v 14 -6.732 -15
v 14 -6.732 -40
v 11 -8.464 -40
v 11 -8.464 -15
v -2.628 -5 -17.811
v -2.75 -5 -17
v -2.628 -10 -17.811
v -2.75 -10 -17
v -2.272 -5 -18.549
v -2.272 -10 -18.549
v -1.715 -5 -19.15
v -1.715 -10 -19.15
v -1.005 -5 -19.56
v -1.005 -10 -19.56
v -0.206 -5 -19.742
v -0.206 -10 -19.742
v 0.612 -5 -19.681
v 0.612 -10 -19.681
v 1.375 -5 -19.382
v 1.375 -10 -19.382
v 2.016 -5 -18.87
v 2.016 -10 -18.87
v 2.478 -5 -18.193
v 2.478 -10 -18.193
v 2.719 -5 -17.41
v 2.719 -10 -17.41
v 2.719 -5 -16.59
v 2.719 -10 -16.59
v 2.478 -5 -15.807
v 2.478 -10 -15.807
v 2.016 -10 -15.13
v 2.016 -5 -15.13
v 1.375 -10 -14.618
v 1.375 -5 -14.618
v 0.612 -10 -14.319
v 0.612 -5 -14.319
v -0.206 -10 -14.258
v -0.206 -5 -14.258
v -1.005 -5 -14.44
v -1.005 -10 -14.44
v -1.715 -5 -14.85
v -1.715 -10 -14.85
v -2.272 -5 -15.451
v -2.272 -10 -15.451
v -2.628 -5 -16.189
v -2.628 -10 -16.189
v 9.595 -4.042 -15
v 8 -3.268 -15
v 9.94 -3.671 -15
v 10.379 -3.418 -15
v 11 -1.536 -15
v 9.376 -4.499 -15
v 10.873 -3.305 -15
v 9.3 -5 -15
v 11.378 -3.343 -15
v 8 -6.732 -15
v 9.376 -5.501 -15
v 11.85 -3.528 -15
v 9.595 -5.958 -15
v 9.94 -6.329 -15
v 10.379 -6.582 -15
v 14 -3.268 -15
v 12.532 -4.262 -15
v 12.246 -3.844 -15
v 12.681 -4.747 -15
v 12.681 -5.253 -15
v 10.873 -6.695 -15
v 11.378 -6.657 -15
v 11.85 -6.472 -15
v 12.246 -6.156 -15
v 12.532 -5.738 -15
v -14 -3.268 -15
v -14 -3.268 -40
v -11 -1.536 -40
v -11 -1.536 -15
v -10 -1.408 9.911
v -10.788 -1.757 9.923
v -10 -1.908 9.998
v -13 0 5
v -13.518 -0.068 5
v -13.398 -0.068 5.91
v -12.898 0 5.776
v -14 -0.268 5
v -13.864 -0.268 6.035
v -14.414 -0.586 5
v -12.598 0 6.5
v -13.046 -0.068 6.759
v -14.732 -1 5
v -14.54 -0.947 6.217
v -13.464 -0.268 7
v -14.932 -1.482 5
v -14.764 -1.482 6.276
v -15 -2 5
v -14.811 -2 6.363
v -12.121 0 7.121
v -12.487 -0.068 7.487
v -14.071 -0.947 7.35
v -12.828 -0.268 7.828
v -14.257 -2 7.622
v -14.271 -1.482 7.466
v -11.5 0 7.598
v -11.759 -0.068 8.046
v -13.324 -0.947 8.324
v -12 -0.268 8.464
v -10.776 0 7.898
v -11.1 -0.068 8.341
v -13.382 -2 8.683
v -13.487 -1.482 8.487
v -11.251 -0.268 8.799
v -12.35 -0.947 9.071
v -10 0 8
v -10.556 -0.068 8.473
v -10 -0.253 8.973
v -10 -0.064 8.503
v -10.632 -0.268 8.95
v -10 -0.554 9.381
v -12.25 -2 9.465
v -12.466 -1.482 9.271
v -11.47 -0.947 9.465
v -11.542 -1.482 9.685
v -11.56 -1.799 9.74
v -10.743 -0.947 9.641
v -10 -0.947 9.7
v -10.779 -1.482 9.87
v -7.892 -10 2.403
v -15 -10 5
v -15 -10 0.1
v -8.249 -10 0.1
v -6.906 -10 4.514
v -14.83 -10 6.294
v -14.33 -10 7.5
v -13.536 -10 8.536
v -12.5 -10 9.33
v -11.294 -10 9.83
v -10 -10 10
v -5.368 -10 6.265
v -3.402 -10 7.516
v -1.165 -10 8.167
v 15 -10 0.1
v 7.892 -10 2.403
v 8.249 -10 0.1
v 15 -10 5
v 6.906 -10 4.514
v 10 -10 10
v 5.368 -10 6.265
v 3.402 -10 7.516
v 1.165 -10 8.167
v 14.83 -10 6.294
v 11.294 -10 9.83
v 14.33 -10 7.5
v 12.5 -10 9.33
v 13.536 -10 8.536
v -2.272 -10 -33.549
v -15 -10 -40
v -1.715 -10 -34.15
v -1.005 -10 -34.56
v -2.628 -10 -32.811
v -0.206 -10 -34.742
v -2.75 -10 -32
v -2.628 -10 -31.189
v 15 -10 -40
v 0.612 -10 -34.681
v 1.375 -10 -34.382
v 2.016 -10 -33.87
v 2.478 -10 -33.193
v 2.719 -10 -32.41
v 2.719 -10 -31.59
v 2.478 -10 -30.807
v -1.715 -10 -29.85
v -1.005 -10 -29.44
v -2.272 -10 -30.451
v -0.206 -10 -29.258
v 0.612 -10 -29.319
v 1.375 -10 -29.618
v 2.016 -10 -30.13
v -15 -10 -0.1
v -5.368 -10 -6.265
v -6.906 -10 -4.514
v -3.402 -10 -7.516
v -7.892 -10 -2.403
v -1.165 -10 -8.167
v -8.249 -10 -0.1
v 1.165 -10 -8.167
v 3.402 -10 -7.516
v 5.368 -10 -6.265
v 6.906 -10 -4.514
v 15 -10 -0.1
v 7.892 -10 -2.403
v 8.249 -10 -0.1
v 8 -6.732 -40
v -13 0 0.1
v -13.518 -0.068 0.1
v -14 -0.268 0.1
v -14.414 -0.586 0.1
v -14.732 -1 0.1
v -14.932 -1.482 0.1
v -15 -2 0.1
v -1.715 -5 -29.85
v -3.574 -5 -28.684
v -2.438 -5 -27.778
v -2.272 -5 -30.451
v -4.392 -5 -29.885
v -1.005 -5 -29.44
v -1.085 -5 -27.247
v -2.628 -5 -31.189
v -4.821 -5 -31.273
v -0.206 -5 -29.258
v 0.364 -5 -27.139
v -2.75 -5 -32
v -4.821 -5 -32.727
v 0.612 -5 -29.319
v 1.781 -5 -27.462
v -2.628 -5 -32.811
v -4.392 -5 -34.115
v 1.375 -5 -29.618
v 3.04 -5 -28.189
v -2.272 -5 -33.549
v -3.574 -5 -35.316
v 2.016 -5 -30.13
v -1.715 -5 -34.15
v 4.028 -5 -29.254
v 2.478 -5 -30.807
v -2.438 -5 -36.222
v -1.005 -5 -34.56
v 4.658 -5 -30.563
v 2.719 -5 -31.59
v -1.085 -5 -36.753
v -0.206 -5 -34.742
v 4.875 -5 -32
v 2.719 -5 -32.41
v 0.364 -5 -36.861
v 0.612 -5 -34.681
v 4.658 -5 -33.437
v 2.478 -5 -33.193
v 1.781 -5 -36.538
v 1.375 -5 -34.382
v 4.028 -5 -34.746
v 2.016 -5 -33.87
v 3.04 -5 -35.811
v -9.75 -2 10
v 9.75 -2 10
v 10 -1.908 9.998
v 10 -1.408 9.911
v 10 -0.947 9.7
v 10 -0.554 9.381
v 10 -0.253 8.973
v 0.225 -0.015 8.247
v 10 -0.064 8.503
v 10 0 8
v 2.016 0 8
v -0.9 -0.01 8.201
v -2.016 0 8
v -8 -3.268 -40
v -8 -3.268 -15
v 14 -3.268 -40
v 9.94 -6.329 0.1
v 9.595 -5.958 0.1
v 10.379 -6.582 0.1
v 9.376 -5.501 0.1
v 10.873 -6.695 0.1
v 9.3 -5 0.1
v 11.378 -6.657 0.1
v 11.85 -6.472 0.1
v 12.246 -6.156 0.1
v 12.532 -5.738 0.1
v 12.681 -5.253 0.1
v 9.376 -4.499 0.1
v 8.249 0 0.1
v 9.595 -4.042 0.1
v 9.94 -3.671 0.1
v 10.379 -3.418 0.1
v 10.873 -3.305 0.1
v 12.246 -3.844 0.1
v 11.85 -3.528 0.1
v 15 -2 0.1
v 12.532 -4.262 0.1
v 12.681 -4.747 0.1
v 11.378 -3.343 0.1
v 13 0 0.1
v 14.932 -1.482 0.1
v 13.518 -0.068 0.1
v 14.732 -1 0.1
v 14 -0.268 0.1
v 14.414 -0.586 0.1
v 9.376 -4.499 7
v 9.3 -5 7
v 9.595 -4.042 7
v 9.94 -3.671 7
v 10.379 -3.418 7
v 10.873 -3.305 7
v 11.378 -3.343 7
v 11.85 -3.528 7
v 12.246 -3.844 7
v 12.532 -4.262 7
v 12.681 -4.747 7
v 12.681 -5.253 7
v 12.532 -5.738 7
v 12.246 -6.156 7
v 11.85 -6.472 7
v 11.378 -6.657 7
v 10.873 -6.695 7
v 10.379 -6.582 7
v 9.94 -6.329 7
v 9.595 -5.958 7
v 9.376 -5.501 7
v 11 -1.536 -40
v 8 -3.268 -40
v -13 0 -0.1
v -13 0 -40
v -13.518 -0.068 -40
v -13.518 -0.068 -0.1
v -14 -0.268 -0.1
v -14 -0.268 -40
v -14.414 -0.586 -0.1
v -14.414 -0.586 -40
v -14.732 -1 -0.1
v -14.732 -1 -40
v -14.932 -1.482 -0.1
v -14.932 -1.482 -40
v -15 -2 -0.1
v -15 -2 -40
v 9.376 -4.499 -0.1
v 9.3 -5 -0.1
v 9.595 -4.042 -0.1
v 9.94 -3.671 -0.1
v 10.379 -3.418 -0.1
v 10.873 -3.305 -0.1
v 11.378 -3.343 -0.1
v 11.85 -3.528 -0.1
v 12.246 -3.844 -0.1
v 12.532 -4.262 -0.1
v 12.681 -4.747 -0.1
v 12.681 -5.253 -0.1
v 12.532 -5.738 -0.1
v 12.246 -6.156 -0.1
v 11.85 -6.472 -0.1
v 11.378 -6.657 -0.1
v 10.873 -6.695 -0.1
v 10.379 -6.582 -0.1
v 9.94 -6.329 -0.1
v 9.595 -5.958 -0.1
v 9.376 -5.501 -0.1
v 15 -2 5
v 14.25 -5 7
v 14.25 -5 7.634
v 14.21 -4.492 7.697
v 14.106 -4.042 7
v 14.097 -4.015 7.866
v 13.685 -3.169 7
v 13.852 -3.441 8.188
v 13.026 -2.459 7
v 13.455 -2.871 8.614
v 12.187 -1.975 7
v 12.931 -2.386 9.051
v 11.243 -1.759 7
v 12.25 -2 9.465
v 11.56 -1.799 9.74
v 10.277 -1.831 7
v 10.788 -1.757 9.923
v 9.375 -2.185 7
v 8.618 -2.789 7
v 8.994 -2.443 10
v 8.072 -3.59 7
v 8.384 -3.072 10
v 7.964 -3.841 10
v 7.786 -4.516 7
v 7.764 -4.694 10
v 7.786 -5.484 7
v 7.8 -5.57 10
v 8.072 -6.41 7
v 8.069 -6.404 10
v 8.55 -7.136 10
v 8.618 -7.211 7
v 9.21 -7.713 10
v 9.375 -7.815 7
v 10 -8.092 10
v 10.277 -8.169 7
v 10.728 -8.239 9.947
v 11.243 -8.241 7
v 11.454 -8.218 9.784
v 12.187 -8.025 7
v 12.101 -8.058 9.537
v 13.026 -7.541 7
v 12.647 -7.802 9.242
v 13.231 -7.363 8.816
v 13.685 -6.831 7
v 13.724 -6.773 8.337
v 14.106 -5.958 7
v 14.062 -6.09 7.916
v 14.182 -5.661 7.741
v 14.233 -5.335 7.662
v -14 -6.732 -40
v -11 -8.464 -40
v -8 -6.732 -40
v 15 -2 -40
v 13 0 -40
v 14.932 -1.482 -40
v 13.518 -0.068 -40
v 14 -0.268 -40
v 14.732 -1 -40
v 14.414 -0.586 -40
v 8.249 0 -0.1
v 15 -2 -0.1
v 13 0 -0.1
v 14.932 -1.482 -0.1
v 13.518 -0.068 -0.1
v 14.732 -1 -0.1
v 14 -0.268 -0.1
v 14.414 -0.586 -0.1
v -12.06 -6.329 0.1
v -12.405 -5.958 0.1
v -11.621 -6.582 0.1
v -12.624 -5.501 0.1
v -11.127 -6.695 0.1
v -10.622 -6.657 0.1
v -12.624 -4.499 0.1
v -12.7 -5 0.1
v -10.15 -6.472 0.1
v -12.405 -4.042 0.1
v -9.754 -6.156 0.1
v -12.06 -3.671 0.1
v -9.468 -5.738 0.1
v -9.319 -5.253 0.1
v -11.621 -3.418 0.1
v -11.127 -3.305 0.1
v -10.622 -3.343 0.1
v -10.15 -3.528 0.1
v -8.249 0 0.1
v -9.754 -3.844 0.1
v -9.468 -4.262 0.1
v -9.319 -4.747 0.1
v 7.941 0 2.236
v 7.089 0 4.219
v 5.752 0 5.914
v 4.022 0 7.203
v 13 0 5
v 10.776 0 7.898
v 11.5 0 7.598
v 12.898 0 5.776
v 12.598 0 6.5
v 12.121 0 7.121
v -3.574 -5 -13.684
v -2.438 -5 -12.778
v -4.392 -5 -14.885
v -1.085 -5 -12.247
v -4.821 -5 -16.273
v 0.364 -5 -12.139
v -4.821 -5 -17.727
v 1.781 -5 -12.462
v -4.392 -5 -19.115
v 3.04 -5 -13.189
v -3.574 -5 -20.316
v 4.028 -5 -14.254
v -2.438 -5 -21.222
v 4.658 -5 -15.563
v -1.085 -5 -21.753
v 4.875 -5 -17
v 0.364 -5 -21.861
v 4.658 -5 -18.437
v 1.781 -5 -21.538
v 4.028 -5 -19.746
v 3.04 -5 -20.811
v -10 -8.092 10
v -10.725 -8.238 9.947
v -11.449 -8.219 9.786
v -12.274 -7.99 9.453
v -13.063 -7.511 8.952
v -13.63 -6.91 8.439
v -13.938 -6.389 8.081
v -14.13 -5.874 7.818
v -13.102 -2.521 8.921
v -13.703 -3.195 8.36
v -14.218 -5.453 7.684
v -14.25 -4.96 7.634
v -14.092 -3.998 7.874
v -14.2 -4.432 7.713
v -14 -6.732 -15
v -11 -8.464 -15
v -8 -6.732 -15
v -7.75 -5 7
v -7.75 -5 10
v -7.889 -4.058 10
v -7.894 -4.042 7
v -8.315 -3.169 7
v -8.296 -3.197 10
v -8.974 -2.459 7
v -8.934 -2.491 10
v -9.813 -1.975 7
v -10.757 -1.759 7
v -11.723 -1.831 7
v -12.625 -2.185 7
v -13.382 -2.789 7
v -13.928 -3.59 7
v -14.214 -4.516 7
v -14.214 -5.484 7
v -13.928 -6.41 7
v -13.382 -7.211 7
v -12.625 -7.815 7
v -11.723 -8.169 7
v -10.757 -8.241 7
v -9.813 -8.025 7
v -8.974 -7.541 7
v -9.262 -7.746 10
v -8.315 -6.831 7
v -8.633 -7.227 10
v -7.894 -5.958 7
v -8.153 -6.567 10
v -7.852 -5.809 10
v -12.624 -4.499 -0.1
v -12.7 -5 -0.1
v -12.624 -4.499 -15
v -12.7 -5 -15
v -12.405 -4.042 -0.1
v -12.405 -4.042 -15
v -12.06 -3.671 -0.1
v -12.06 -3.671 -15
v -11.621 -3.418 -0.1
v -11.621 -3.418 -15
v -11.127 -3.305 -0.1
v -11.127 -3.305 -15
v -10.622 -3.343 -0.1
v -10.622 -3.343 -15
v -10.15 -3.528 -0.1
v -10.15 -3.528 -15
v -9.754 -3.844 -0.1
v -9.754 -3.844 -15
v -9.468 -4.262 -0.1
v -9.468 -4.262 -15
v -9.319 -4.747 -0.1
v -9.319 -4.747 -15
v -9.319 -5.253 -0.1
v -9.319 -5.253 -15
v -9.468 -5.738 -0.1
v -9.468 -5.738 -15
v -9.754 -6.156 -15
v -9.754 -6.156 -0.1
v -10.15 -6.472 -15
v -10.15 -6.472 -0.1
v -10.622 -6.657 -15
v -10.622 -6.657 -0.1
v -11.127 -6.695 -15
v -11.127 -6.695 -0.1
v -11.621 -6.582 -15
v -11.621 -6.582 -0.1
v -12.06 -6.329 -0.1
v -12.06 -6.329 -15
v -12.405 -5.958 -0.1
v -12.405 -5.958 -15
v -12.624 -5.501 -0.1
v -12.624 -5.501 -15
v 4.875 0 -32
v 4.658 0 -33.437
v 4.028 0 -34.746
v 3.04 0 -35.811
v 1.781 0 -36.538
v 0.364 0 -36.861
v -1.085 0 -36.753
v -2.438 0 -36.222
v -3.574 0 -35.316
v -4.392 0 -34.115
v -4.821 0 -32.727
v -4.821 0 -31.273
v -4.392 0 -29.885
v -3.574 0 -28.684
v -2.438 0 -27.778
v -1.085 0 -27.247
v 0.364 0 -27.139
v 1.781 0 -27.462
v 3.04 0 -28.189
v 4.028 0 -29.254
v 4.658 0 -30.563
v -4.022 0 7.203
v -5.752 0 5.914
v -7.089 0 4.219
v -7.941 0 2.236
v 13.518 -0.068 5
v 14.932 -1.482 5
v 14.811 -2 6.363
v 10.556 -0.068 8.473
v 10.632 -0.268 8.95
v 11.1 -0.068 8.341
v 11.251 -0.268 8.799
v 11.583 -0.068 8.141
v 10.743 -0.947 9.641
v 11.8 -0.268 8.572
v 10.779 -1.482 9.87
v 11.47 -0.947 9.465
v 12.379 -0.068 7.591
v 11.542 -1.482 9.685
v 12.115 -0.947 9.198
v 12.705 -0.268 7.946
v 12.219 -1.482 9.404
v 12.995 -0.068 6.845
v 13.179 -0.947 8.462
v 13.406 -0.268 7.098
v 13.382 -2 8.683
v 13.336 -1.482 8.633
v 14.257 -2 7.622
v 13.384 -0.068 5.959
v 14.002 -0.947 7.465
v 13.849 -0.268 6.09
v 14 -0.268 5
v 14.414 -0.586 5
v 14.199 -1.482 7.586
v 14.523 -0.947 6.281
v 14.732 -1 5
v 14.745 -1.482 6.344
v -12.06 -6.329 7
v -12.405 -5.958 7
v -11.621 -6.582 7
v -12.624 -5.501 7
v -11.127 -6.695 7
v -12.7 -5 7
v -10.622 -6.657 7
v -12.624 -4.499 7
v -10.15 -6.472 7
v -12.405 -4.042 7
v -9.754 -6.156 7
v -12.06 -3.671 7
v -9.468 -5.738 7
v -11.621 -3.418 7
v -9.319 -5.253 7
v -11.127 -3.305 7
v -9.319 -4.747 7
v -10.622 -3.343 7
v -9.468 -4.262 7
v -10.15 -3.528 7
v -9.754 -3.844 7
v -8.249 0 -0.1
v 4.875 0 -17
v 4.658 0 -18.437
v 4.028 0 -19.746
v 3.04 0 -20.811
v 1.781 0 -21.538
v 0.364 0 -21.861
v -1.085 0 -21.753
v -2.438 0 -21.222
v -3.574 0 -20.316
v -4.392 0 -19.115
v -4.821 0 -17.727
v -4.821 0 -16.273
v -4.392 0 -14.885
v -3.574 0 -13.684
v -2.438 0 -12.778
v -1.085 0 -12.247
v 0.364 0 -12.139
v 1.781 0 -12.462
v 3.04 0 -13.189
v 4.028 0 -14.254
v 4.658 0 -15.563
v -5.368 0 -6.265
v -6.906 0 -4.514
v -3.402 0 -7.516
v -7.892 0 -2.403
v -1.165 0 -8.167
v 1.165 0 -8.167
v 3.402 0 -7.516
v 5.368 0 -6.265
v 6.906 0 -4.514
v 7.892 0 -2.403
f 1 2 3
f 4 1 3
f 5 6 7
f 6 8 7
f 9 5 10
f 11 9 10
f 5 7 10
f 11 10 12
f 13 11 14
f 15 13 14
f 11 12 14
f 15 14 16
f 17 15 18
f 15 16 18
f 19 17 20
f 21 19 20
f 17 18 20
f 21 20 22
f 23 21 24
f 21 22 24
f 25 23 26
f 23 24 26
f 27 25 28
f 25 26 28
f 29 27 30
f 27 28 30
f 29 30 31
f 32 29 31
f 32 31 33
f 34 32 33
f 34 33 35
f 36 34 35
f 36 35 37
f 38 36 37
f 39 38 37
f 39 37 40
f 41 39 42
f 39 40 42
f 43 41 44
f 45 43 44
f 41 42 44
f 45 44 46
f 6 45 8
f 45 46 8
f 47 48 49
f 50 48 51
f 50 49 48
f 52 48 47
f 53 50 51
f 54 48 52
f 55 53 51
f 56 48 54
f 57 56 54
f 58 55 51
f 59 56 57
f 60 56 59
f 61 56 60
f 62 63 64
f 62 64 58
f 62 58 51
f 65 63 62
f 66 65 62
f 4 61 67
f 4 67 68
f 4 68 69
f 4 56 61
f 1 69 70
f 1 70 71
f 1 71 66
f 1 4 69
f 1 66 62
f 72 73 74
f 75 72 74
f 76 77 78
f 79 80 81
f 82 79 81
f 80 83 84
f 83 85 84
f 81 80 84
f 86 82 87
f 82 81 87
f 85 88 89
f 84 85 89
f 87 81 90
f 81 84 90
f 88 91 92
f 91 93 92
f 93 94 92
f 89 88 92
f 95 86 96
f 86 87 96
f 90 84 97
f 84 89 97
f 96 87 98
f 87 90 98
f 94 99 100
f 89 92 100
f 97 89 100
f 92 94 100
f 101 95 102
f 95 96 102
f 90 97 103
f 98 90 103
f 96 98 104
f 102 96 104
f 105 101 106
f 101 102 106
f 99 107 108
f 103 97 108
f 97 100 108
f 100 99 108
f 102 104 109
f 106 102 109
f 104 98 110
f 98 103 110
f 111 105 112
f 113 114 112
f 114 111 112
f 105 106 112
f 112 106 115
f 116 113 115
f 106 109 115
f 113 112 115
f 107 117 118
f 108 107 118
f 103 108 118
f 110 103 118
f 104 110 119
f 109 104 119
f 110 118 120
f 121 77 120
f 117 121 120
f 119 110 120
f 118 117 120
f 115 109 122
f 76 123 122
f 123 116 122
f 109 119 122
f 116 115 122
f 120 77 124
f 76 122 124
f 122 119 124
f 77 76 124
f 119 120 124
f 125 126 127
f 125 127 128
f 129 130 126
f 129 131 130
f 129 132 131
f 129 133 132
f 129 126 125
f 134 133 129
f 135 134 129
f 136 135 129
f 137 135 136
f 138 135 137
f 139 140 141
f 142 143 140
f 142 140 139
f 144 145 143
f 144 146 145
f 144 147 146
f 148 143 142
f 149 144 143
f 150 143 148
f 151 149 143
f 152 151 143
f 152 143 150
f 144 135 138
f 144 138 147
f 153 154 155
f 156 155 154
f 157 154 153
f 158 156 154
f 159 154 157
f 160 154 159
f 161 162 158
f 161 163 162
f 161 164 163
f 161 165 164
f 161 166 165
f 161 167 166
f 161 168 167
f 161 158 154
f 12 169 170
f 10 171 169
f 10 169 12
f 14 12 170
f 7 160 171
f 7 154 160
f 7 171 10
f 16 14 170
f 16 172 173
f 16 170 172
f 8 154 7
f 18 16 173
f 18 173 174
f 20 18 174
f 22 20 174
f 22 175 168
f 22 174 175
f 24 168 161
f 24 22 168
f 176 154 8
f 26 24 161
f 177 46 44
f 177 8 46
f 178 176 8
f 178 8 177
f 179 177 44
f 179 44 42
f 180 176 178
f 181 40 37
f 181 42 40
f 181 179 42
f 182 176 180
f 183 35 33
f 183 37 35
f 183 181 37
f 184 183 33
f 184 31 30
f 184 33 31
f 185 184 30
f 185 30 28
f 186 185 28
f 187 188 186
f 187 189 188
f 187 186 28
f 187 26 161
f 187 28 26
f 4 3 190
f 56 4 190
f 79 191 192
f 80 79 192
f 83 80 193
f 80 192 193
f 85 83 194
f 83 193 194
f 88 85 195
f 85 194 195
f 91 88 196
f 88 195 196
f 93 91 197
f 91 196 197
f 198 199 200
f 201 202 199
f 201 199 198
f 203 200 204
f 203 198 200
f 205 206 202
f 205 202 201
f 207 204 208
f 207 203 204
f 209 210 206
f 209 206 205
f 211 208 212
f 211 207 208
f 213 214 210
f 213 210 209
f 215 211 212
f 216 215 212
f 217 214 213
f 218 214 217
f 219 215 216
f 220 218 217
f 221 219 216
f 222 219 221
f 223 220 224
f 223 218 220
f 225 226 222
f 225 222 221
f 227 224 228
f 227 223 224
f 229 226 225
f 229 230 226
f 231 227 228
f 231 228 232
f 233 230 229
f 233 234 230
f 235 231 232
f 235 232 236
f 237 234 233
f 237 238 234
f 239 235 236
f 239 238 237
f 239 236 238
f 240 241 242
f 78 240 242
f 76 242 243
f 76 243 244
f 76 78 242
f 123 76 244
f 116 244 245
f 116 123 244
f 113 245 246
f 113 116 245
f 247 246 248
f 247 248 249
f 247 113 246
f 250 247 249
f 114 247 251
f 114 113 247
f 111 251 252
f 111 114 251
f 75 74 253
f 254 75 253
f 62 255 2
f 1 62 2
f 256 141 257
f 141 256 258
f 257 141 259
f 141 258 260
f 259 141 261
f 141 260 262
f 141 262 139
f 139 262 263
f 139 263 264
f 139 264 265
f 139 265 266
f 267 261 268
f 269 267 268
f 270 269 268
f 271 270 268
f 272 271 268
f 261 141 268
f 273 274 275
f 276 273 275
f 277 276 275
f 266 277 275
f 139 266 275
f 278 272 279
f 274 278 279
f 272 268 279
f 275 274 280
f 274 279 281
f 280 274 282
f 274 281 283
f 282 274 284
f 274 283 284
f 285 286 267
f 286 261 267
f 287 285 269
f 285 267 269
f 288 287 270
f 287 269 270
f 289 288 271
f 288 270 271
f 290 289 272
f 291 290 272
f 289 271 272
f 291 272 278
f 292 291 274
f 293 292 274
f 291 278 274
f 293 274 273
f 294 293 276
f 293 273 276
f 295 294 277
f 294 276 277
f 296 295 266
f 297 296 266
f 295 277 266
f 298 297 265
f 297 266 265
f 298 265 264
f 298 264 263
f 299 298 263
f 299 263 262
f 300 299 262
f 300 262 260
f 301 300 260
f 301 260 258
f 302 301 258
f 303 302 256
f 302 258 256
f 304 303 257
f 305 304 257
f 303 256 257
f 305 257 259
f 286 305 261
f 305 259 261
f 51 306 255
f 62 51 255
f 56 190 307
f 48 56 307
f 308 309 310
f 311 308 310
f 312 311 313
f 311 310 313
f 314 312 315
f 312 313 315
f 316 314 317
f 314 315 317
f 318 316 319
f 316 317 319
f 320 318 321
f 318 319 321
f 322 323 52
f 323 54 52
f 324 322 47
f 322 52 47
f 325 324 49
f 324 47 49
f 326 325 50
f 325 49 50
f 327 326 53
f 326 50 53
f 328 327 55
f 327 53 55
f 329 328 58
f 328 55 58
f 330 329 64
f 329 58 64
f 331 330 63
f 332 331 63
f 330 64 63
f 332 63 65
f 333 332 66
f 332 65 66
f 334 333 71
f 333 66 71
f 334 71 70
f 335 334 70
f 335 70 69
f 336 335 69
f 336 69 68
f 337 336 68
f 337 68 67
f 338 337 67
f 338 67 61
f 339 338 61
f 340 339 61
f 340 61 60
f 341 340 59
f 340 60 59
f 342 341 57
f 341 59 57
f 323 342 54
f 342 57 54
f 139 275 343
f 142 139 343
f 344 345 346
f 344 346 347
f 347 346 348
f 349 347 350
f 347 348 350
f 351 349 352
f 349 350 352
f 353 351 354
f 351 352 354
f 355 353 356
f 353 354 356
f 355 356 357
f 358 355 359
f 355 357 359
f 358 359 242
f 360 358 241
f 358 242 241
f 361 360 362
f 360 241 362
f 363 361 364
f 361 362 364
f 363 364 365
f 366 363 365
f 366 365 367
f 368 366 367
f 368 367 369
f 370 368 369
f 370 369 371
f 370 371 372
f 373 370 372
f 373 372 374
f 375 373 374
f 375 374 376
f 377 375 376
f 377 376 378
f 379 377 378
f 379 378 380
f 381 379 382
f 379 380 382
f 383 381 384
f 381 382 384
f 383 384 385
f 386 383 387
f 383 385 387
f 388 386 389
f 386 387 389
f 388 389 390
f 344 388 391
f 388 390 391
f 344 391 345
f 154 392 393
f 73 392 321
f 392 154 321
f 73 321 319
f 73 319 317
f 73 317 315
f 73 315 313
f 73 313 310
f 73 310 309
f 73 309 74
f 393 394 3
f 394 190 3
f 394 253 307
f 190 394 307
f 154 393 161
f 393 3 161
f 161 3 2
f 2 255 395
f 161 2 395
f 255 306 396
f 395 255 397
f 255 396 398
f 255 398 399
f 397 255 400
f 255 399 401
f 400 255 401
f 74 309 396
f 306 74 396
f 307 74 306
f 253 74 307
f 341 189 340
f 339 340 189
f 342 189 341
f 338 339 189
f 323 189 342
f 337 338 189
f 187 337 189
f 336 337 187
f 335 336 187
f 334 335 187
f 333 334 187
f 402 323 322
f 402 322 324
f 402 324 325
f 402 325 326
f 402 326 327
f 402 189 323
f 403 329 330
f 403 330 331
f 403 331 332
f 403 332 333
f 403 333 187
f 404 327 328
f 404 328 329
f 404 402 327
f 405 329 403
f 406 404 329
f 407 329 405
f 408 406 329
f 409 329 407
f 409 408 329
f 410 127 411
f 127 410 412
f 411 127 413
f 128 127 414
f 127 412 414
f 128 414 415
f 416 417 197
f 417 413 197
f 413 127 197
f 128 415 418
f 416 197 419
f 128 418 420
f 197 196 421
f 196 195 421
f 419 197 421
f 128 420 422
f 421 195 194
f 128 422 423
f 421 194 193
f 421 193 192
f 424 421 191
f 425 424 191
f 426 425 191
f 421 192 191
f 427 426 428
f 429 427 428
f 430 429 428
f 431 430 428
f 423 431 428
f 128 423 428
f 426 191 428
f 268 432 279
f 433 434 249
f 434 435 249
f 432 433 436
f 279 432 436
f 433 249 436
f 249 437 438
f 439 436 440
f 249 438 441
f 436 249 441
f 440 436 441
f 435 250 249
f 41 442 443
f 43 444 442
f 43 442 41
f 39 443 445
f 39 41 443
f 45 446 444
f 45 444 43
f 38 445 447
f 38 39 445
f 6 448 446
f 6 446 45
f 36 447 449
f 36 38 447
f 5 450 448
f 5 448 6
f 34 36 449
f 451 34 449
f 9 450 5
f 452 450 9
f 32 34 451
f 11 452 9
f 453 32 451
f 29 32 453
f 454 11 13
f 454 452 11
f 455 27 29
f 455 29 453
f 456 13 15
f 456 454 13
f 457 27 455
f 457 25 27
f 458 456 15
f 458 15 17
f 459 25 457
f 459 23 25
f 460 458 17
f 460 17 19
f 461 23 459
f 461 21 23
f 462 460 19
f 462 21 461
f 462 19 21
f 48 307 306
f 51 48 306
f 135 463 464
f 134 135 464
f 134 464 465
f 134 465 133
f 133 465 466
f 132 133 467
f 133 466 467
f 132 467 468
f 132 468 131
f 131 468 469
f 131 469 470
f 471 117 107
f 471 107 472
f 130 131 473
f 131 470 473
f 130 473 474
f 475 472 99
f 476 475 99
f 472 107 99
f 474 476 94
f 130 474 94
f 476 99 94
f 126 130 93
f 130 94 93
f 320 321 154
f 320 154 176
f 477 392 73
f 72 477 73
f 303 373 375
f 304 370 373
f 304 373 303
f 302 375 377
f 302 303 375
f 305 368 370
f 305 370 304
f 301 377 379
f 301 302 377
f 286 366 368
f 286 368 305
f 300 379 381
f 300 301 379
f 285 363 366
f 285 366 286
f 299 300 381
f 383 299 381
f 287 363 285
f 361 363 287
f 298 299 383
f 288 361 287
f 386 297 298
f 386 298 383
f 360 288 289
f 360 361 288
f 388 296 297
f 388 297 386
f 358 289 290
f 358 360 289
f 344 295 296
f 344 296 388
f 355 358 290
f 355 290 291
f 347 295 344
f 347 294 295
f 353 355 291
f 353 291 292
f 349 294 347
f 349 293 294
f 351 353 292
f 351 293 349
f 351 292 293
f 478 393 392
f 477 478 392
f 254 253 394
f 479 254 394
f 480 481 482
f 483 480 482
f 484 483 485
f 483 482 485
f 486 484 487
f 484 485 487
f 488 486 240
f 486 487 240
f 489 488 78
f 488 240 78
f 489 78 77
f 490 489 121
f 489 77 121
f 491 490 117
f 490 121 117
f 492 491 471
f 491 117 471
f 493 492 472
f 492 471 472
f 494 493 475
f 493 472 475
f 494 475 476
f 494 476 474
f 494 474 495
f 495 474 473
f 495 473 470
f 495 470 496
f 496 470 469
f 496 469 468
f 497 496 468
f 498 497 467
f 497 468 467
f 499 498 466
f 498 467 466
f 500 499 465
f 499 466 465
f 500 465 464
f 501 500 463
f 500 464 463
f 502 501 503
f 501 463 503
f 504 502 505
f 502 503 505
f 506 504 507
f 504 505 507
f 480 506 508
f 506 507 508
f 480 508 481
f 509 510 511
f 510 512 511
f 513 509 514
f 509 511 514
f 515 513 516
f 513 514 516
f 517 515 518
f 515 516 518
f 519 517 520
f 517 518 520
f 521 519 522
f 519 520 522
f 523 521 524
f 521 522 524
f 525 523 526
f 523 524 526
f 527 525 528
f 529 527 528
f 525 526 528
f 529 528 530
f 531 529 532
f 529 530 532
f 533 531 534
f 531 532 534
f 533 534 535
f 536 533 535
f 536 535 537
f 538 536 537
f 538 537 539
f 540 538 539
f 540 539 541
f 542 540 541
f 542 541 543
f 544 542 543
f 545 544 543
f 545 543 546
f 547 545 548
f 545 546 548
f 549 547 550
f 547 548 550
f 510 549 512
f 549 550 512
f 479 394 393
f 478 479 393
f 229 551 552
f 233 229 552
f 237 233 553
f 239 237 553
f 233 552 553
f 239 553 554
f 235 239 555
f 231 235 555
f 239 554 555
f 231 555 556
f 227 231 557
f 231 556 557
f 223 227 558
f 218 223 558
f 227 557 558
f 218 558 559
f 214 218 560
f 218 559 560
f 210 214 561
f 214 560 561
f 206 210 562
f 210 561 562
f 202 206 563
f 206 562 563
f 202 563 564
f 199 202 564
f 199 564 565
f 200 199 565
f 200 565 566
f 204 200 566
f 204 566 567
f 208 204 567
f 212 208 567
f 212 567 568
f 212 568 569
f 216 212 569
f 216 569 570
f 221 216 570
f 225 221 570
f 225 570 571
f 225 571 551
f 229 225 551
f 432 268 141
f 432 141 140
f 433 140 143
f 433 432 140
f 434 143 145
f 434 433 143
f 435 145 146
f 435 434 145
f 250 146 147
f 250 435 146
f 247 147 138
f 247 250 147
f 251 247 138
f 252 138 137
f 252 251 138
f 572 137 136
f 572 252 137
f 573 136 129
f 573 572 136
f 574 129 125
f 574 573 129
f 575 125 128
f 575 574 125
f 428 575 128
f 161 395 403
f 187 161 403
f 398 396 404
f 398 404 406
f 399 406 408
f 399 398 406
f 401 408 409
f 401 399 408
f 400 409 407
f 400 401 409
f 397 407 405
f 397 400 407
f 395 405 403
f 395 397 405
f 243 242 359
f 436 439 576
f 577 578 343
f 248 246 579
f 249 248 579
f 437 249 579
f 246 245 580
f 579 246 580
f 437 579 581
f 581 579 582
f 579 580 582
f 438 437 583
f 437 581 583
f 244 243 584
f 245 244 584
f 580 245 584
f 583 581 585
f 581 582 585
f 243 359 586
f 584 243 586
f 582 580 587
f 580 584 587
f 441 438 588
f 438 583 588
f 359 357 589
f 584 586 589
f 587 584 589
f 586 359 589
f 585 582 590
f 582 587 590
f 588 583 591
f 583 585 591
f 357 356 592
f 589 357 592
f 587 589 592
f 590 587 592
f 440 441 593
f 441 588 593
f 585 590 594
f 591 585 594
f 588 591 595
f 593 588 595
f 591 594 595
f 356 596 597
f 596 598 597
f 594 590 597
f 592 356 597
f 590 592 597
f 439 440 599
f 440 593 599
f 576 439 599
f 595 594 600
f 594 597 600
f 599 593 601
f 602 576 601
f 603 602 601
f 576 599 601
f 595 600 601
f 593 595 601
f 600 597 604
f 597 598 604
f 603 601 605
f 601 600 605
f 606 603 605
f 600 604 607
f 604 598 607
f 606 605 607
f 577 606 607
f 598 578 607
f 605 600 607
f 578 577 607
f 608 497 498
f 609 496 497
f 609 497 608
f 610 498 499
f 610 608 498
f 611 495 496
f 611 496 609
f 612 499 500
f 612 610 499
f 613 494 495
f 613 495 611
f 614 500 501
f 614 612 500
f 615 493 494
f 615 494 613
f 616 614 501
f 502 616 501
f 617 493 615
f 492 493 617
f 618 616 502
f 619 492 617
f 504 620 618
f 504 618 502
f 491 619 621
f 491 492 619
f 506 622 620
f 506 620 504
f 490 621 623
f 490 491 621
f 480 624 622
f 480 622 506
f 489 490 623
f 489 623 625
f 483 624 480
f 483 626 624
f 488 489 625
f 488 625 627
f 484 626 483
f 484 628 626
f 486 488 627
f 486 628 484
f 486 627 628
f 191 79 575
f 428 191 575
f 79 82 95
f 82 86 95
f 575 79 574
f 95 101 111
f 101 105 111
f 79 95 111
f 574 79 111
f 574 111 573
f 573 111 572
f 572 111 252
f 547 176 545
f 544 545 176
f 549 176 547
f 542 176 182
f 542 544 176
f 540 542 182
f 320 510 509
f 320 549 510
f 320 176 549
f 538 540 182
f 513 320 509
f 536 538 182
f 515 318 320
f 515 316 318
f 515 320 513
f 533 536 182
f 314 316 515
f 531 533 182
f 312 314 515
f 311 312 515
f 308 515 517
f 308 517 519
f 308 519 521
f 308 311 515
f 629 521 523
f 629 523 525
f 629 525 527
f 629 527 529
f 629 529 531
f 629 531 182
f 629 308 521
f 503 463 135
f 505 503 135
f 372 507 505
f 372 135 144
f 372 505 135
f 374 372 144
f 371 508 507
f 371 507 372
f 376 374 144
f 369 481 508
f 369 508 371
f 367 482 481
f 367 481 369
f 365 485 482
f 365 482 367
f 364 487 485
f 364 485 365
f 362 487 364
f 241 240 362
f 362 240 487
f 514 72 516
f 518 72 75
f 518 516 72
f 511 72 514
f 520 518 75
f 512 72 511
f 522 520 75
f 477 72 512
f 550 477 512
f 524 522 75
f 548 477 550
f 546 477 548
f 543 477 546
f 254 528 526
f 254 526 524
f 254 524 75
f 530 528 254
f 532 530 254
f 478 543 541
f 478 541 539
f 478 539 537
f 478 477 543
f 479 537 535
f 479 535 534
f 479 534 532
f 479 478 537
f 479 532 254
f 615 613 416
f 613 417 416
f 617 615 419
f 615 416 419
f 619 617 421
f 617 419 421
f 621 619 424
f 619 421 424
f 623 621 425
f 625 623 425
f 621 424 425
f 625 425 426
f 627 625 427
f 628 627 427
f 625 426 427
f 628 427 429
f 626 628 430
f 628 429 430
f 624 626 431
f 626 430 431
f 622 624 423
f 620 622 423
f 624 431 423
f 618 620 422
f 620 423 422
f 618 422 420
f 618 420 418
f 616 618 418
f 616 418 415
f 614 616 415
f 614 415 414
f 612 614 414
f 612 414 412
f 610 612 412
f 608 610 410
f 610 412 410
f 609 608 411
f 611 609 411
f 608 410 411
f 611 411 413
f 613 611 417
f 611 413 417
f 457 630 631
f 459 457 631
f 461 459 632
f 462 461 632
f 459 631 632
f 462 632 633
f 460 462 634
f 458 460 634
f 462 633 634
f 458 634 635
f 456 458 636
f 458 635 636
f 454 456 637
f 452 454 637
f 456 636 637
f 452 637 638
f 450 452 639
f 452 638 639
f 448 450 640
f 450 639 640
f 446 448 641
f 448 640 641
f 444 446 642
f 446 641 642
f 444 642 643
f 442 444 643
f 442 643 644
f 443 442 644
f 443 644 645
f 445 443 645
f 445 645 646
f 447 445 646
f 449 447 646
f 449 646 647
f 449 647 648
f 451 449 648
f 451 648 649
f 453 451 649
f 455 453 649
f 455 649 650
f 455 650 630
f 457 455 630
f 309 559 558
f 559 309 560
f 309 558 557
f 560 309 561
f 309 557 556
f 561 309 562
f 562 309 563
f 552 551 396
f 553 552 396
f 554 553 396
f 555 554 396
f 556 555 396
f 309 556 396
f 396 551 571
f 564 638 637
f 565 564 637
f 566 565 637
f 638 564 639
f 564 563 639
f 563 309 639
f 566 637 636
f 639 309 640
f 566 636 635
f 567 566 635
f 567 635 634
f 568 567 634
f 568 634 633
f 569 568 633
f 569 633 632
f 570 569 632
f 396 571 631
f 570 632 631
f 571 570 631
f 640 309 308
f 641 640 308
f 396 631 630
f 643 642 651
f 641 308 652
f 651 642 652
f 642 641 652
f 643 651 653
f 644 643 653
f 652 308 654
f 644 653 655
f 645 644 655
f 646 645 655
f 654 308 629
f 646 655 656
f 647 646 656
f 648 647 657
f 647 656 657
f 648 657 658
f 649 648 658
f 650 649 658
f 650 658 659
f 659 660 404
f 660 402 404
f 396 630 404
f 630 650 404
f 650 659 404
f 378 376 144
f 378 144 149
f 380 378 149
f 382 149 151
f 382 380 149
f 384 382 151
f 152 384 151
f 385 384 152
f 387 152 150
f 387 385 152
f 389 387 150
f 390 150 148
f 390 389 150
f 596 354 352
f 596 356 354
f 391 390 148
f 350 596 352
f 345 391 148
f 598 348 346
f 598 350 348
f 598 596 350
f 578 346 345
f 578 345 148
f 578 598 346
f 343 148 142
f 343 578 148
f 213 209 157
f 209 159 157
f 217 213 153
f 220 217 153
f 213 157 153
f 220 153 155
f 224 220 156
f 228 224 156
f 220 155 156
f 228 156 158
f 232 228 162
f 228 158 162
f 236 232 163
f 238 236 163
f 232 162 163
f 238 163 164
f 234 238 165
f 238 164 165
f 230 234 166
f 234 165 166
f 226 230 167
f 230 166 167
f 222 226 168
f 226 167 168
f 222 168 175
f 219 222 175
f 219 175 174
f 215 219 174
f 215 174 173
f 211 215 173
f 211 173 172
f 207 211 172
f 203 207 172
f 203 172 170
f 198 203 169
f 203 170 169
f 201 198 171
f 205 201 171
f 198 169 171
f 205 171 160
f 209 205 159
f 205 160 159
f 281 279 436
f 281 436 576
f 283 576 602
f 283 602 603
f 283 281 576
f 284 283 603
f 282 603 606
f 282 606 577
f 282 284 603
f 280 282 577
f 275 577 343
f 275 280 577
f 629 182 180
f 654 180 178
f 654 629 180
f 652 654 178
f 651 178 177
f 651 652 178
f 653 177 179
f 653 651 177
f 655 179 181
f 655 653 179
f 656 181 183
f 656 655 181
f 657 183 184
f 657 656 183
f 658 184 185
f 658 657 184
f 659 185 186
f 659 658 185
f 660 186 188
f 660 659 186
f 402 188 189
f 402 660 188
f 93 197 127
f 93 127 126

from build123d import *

# Parameters (mm, degrees)
F0_W           = 30
F0_H           = 50
F0_R           = 8.25
F1_DEPTH       = 10
F2_D           = 5.5
F2_CBORE_D     = 9.75
F2_CBORE_DEPTH = 5
F4_D           = 3.4
F4_CBORE_D     = 6.5
F4_CBORE_DEPTH = 3
F5_T1_DEPTH    = 35
F6_R           = 1.7
F7_DEPTH       = 25
F8_T1_DEPTH    = 50
F8_T3_DEPTH    = 20
F8_T6_ANGLE    = 89.9999999974
F8_T8_ANGLE    = 89.9999999974
F9_W           = 50
F9_H           = 0.2
F10_DEPTH      = 25


# Not quite as in the source:
# - a fillet or chamfer that OpenCascade refuses, or shapes differently, is made with other operations: its cross-section is extruded or revolved along the edge and cut away or added


with BuildPart() as f1:
    # F0 (on Front) → F1 (new body)
    with BuildSketch(Plane.XZ):
        with Locations((0, -15)):
            Rectangle(F0_W, F0_H)
        Circle(F0_R, mode=Mode.SUBTRACT)
    extrude(amount=F1_DEPTH)

    # F2 (through all)
    with Locations(Plane(origin=(0, 0, 0), x_dir=(1, 0, 0), z_dir=(0, 1, 0))):
        with Locations((0, 17), (0, 32)):
            CounterBoreHole(F2_D / 2, F2_CBORE_D / 2, F2_CBORE_DEPTH)

    # F4 (through all)
    with Locations(Plane.XY.offset(10)):
        with Locations((11, -5), (-11, -5)):
            CounterBoreHole(F4_D / 2, F4_CBORE_D / 2, F4_CBORE_DEPTH)

    # F5: fillet of radius 5 on 2 edges, made by hand

    # F5_s2 → F5_t1 (cut)
    with BuildSketch(Plane.XZ.offset(-12.5)):
        with BuildLine():
            ThreePointArc((10, 10), (13.5355339059, 8.5355339059), (15, 5))
            Line((15, 5), (15, 10))
            Line((15, 10), (10, 10))
        make_face()
        with BuildLine():
            ThreePointArc((-10, 10), (-13.5355339059, 8.5355339059), (-15, 5))
            Line((-15, 5), (-15, 10))
            Line((-15, 10), (-10, 10))
        make_face()
    extrude(amount=F5_T1_DEPTH, mode=Mode.SUBTRACT)

    # F6 (on face) → F7 (cut)
    with BuildSketch(Plane(origin=(0, 0, -40), x_dir=(1, 0, 0), z_dir=(0, 0, -1))):
        Polygon((11, 8.4641016151), (8, 6.7320508076), (8, 3.2679491924), (11, 1.5358983849), (14, 3.2679491924), (14, 6.7320508076), align=None)
        with Locations((11, 5)):
            Circle(F6_R, mode=Mode.SUBTRACT)
        Polygon((-8, 6.7320508076), (-11, 8.4641016151), (-14, 6.7320508076), (-14, 3.2679491924), (-11, 1.5358983849), (-8, 3.2679491924), align=None)
        with Locations((-11, 5)):
            Circle(F6_R, mode=Mode.SUBTRACT)
    extrude(amount=-F7_DEPTH, mode=Mode.SUBTRACT)

    # F8: fillet of radius 2 on 5 edges, made by hand

    # F8_s2 → F8_t1 (cut)
    with BuildSketch(Plane.XY.offset(-45)):
        with BuildLine():
            ThreePointArc((13, 0), (14.4142135624, -0.5857864376), (15, -2))
            Line((15, -2), (15, 0))
            Line((15, 0), (13, 0))
        make_face()
        with BuildLine():
            ThreePointArc((-13, 0), (-14.4142135624, -0.5857864376), (-15, -2))
            Line((-15, -2), (-15, 0))
            Line((-15, 0), (-13, 0))
        make_face()
    extrude(amount=F8_T1_DEPTH, mode=Mode.SUBTRACT)

    # F8_s4 → F8_t3 (cut)
    with BuildSketch(Plane.YZ.offset(-10)):
        with BuildLine():
            ThreePointArc((-2, 10), (-0.5857864376, 9.4142135624), (0, 8))
            Line((0, 8), (0, 10))
            Line((0, 10), (-2, 10))
        make_face()
    extrude(amount=F8_T3_DEPTH, mode=Mode.SUBTRACT)

    # F8_s5 → F8_t6 (revolve, cut)
    with BuildSketch(Plane.YZ.offset(9.9999999999)):
        with BuildLine():
            ThreePointArc((0, 8), (-0.5857864376, 9.4142135624), (-2, 10))
            Line((-2, 10), (0, 10))
            Line((0, 10), (0, 8))
        make_face()
    revolve(axis=Axis((9.9999999999, 0, 4.9999999999), (0, 1, 0)), revolution_arc=F8_T6_ANGLE, mode=Mode.SUBTRACT)

    # F8_s7 → F8_t8 (revolve, cut)
    with BuildSketch(Plane.XY.offset(4.9999999999)):
        with BuildLine():
            ThreePointArc((-13, 0), (-14.4142135624, -0.5857864376), (-15, -2))
            Line((-15, -2), (-15, 0))
            Line((-15, 0), (-13, 0))
        make_face()
    revolve(axis=Axis((-9.9999999999, 0, 4.9999999999), (0, 1, 0)), revolution_arc=F8_T8_ANGLE, mode=Mode.SUBTRACT)

    # F9 (on face) → F10 (cut)
    with BuildSketch(Plane.XZ):
        Rectangle(F9_W, F9_H)
    extrude(amount=F10_DEPTH, mode=Mode.SUBTRACT)


solid = f1.part
